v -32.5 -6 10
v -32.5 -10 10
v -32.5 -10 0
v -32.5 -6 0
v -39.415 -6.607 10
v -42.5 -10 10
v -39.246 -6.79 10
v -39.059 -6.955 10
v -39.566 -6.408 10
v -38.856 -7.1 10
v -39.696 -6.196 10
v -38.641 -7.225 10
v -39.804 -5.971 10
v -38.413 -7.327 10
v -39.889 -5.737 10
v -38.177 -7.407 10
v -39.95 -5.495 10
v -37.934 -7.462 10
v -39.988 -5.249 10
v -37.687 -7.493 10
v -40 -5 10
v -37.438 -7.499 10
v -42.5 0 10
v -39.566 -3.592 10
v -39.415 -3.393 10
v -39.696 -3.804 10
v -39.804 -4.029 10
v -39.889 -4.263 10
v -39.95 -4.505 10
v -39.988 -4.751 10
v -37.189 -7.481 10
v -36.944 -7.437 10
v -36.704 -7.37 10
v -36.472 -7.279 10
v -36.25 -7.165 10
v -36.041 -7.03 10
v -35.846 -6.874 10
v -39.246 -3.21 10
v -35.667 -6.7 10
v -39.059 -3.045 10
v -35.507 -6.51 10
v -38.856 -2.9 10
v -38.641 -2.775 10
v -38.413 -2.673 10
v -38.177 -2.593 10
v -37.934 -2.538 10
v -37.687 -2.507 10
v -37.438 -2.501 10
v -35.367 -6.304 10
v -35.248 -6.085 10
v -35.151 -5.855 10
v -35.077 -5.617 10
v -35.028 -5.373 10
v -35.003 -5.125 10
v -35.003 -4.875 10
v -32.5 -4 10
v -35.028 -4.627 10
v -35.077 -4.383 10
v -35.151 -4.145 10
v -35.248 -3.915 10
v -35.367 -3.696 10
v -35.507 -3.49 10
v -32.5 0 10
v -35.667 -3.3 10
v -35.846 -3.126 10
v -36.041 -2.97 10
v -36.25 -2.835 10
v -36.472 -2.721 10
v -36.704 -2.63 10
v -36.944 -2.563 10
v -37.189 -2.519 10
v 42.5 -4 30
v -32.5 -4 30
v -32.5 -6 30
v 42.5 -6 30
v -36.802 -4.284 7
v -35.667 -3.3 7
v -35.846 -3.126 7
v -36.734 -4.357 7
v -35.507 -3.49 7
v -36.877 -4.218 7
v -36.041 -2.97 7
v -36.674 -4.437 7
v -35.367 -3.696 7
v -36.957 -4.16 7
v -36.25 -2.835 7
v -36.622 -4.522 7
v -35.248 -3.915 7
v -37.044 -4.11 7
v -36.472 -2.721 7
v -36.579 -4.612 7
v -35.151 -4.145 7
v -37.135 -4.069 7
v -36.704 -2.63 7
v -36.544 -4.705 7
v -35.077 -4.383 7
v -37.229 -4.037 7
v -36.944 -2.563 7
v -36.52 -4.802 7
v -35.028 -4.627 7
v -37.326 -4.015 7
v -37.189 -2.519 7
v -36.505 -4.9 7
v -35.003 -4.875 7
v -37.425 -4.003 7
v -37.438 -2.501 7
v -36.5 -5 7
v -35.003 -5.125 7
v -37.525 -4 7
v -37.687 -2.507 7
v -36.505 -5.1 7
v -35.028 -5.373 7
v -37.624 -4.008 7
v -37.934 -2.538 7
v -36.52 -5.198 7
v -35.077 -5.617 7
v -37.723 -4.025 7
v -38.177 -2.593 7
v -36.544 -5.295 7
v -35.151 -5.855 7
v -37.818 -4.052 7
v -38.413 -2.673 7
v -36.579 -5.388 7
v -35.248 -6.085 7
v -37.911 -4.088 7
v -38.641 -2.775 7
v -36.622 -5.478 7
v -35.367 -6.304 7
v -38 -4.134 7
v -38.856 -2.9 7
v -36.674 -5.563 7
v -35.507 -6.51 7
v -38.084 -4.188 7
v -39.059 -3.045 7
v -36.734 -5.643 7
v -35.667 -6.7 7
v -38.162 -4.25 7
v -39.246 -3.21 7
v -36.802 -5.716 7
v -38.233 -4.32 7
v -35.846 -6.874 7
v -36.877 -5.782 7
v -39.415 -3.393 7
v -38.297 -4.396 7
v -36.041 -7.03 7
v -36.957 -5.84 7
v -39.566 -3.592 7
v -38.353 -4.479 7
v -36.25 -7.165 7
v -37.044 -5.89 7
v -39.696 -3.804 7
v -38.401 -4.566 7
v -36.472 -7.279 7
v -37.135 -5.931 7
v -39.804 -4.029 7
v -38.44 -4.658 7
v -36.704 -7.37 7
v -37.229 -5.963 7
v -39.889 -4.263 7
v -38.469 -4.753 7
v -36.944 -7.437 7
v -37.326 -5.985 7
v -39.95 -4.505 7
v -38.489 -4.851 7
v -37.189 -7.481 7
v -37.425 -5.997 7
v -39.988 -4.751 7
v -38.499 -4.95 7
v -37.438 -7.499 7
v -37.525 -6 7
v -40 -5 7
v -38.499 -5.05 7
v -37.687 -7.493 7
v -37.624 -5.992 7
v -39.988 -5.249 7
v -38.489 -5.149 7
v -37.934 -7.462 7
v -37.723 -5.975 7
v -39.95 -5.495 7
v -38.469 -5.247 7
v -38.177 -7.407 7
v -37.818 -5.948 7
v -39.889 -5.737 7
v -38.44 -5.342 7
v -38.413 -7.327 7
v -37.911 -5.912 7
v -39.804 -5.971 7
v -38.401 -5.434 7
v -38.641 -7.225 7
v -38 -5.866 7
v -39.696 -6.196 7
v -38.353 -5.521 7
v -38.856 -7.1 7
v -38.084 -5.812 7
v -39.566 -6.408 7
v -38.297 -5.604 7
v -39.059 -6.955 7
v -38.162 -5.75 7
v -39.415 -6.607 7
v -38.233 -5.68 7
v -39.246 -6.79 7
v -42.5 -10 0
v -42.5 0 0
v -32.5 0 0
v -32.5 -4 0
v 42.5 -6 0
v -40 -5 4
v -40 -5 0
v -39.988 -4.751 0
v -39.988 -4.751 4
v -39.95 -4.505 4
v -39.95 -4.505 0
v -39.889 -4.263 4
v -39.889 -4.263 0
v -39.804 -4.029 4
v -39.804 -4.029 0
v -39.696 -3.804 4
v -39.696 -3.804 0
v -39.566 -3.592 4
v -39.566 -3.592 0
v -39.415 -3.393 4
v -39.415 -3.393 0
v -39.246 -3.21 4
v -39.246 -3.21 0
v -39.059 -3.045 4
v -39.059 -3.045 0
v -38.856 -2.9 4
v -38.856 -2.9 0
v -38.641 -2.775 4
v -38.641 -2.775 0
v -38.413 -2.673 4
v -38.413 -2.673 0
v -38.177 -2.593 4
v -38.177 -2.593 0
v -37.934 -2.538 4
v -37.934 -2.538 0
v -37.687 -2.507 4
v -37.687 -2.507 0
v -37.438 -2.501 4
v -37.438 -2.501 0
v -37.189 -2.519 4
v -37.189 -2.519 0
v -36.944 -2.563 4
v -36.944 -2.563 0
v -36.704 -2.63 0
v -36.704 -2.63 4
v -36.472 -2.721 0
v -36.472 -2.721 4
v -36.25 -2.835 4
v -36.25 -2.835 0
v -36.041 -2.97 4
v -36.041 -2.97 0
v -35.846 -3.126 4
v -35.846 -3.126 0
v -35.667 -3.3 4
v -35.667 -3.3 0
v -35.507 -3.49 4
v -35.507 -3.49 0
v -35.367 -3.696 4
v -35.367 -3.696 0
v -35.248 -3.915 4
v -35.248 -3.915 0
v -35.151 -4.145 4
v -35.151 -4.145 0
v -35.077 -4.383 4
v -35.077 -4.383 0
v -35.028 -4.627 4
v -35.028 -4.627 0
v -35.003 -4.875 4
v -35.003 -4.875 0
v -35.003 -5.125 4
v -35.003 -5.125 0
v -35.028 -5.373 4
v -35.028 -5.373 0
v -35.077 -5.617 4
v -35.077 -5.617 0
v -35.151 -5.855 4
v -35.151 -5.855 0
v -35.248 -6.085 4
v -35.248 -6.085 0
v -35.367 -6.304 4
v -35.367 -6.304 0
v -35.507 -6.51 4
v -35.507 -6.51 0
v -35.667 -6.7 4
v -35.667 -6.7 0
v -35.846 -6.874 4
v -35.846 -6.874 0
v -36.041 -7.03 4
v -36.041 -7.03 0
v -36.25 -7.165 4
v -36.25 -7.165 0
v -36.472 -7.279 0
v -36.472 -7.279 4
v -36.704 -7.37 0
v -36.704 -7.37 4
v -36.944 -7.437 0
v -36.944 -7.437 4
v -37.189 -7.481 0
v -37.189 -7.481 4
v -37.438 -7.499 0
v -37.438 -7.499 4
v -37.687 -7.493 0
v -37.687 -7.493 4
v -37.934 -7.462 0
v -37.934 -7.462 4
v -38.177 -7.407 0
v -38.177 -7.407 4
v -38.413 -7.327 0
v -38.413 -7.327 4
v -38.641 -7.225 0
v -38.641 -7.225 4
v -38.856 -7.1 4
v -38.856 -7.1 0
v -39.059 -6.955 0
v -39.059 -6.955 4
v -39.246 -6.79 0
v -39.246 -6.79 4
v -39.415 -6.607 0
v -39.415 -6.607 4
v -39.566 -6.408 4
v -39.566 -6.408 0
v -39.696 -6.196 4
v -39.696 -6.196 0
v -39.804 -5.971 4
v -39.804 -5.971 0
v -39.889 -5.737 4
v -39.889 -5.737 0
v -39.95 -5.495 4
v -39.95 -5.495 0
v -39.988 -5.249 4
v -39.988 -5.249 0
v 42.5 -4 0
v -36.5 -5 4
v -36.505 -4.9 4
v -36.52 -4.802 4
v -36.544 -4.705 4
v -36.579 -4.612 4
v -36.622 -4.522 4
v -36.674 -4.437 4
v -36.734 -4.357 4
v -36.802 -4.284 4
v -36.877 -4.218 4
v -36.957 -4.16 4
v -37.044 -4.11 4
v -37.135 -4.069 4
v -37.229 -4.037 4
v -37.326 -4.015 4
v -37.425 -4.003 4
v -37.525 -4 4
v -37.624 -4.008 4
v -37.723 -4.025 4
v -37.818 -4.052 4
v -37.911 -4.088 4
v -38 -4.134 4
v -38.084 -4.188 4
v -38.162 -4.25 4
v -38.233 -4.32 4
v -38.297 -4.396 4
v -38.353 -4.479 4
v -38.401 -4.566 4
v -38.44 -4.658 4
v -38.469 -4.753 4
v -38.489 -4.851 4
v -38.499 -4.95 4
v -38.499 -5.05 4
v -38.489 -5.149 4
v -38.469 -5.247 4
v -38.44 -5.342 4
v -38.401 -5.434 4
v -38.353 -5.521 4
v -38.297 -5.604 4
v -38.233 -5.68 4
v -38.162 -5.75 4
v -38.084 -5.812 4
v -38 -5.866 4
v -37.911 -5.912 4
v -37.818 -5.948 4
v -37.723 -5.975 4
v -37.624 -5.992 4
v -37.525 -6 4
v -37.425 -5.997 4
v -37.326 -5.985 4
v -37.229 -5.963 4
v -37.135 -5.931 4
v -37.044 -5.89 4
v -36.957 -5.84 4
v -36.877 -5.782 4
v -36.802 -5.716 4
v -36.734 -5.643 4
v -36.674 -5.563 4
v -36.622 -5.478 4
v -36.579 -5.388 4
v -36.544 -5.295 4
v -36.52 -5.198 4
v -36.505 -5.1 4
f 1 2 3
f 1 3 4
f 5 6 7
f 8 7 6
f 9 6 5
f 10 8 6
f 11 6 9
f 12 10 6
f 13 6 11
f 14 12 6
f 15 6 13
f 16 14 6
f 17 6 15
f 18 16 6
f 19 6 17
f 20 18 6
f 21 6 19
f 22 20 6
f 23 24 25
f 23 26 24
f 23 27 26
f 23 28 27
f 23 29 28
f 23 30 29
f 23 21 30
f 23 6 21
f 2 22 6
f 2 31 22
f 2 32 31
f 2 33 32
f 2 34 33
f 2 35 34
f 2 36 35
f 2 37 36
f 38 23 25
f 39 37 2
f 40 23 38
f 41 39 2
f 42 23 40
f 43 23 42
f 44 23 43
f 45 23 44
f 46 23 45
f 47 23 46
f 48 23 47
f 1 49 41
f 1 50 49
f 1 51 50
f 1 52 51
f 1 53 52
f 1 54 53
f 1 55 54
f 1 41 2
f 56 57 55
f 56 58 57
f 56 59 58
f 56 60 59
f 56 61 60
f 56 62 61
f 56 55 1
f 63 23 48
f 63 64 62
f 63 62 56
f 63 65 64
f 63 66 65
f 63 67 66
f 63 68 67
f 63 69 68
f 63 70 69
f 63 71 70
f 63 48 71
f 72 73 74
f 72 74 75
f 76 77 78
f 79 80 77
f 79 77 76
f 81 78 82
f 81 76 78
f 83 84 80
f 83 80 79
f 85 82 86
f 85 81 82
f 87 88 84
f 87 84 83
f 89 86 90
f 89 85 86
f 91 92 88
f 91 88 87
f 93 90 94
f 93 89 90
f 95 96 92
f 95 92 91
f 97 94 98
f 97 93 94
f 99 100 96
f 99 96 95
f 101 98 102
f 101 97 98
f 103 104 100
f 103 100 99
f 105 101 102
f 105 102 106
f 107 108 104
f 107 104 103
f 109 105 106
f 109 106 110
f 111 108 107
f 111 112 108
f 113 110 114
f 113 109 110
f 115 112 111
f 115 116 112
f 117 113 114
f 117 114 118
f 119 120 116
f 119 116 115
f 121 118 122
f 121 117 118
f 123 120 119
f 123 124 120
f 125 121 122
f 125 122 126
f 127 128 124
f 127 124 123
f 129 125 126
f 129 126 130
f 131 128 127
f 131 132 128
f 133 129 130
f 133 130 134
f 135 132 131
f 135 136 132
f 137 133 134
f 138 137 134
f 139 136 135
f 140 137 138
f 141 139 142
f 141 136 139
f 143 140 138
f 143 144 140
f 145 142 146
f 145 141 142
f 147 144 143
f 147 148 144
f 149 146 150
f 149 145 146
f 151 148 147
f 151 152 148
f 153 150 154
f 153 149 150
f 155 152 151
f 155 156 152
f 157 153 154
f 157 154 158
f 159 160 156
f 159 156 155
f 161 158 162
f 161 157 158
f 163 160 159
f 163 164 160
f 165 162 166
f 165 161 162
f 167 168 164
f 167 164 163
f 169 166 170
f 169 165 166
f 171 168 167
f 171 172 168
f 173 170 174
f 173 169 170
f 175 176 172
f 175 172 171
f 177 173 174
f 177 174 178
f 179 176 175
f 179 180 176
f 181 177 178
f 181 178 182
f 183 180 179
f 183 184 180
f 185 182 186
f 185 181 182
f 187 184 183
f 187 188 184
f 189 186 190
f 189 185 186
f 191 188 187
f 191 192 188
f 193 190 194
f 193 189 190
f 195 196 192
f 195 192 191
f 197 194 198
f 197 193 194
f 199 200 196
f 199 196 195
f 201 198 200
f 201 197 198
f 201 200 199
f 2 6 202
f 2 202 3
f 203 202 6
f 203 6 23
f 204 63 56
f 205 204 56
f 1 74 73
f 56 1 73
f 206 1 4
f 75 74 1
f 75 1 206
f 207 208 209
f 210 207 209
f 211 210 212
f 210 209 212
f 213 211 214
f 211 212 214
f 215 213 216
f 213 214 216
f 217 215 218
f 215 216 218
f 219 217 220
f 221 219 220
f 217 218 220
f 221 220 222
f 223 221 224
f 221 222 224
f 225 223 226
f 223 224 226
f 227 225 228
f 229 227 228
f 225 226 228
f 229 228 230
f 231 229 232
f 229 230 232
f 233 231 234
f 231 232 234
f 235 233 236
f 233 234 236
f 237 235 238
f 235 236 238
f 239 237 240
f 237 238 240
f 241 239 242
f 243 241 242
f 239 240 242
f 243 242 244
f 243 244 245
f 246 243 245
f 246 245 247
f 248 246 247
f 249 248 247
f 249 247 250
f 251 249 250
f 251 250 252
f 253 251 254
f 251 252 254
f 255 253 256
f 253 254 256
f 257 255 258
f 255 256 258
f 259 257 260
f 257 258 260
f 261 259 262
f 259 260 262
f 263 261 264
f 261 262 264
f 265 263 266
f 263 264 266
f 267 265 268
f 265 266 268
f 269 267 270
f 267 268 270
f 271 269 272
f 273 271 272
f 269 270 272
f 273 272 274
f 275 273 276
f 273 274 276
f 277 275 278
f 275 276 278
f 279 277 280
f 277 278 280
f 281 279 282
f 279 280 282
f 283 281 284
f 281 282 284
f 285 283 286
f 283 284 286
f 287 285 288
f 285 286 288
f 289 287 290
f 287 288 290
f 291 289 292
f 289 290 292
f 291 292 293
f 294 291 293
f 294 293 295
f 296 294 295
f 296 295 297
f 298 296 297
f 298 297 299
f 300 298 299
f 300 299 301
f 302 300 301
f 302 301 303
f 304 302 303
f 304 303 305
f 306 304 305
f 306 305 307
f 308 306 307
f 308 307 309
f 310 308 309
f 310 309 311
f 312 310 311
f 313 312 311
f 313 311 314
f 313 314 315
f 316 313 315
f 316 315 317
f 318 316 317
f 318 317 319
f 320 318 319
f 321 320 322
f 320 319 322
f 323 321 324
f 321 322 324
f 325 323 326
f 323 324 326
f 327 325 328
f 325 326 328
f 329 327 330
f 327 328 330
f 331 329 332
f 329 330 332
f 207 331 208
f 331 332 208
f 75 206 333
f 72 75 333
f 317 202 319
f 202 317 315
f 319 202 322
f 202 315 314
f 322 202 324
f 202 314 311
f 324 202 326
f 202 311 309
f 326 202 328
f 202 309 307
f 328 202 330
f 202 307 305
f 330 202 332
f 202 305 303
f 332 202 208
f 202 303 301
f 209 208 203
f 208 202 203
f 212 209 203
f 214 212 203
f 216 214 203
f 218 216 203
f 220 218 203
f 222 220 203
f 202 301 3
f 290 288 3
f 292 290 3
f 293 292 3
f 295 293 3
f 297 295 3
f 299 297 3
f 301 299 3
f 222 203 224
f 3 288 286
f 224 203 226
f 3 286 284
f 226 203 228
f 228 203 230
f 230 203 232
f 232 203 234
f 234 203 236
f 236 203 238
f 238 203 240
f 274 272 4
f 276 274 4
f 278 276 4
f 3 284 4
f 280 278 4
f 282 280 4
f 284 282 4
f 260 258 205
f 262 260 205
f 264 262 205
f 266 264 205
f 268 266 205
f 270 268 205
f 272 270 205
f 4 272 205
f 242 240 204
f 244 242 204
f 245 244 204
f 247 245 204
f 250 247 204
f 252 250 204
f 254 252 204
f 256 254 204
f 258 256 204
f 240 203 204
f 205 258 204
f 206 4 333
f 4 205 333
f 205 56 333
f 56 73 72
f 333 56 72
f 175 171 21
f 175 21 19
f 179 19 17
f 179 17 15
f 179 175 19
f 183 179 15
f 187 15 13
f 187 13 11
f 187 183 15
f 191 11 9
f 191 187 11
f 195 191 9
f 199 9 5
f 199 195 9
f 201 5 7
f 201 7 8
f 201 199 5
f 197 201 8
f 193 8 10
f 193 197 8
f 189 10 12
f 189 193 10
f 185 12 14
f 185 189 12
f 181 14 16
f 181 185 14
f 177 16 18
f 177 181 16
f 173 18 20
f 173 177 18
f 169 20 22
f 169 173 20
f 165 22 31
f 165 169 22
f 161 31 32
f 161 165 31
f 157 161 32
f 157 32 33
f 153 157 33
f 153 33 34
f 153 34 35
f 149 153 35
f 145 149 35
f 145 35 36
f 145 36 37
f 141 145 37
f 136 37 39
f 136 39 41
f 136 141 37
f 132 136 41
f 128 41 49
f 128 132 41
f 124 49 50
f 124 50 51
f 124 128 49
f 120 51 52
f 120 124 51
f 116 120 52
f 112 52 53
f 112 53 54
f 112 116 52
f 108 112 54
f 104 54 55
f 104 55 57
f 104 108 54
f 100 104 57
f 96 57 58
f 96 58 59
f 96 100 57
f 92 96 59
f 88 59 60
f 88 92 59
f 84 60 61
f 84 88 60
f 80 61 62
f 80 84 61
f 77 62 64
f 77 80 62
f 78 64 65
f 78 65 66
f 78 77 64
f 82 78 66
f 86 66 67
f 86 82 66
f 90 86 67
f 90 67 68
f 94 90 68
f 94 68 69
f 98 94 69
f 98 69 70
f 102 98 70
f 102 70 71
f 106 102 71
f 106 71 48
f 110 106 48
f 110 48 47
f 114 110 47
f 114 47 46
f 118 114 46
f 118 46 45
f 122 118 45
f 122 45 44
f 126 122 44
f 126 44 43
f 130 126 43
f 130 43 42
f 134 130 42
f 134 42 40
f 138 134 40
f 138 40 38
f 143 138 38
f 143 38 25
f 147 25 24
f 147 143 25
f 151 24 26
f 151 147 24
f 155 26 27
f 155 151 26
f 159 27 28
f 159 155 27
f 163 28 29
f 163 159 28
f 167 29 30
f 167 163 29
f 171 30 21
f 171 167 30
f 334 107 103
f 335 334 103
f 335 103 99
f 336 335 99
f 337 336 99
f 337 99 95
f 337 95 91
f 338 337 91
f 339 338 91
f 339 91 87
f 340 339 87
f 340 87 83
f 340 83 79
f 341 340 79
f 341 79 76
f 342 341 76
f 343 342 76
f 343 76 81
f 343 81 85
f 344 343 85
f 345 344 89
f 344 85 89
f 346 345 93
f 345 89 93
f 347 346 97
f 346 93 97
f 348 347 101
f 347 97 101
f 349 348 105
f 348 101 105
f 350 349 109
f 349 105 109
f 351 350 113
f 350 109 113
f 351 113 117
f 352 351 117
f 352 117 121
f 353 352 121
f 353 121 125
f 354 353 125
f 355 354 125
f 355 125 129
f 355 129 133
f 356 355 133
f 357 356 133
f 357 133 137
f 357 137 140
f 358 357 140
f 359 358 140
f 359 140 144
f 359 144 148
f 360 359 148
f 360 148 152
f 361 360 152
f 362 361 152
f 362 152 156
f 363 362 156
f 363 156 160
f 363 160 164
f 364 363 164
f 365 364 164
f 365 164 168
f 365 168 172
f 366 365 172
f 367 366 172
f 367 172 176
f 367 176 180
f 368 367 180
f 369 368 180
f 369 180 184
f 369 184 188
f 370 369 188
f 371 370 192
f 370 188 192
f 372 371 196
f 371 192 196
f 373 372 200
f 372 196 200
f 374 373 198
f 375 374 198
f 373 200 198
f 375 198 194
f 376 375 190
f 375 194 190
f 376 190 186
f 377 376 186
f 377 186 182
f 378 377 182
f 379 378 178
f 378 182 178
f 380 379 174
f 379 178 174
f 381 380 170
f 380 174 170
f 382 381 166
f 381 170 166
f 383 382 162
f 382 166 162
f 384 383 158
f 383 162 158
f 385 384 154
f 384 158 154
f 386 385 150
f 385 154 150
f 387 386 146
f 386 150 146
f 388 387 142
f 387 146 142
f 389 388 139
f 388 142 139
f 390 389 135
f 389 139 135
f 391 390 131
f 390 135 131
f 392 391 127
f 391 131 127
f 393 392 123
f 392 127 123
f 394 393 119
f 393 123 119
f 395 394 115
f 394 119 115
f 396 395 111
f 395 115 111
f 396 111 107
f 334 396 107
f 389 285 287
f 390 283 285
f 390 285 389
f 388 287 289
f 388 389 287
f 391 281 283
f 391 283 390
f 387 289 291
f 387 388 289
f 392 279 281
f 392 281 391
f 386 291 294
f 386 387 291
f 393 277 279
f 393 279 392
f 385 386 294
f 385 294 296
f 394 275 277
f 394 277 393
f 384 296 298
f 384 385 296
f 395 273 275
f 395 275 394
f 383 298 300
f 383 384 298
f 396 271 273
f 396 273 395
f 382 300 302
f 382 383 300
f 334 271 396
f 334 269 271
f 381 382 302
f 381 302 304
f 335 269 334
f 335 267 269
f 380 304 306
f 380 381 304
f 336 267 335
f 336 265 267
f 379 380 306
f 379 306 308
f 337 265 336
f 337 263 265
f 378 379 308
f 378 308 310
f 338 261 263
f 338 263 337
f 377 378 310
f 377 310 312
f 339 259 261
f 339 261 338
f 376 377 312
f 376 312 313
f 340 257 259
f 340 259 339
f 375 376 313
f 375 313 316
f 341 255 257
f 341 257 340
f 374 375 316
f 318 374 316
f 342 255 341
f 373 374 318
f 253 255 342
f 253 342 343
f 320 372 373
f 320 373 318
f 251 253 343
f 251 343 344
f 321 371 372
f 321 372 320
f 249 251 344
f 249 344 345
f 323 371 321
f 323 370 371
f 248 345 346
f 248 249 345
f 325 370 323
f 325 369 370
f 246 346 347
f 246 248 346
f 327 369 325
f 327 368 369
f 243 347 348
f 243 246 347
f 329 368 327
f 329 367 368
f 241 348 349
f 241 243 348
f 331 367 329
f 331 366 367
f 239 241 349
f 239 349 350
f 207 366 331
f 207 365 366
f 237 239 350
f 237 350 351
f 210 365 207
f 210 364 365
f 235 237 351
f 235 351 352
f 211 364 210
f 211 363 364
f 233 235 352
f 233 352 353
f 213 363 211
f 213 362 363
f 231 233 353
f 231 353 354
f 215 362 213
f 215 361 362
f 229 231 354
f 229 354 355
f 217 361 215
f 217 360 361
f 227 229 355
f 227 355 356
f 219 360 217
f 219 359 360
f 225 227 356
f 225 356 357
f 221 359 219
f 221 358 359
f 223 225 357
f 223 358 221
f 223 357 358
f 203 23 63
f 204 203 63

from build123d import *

# Parameters (mm, degrees)
SKETCH1_W           = 85
SKETCH1_H           = 30
BOSS_EXTRUDE1_DEPTH = 30
CUT_EXTRUDE1_DEPTH  = 30
SKETCH3_W           = 10
SKETCH3_H           = 10
CUT_EXTRUDE2_DEPTH  = 20
SKETCH4_R           = 2.5
CUT_EXTRUDE3_DEPTH  = 4
CUT_EXTRUDE4_START  = -3
SKETCH5_R           = 2.5
CUT_EXTRUDE4_DEPTH  = 3
SKETCH6_R           = 1
CUT_EXTRUDE5_DEPTH  = 50.348252249


with BuildPart() as part:
    # Sketch1 → Boss-Extrude1 (new body)
    with BuildSketch(Plane.XY):
        Rectangle(SKETCH1_W, SKETCH1_H)
    extrude(amount=BOSS_EXTRUDE1_DEPTH)

    # Sketch2 → Cut-Extrude1 (cut)
    with BuildSketch(Plane.XY.offset(30)):
        Polygon((-42.5, 0), (-32.5, 0), (-32.5, -4), (42.5, -4), (42.5, 15), (-42.5, 15), align=None)
        Polygon((-42.5, -10), (-32.5, -10), (-32.5, -6), (42.5, -6), (42.5, -15), (-42.5, -15), align=None)
    extrude(amount=-CUT_EXTRUDE1_DEPTH, mode=Mode.SUBTRACT)

    # Sketch3 → Cut-Extrude2 (cut)
    with BuildSketch(Plane.XY.offset(30)):
        with Locations((-37.5, -5)):
            Rectangle(SKETCH3_W, SKETCH3_H)
    extrude(amount=-CUT_EXTRUDE2_DEPTH, mode=Mode.SUBTRACT)

    # Sketch4 → Cut-Extrude3 (cut)
    with BuildSketch(Plane(origin=(0, 0, 0), x_dir=(-1, 0, 0), z_dir=(0, 0, -1))):
        with Locations((37.5, -5)):
            Circle(SKETCH4_R)
    extrude(amount=-CUT_EXTRUDE3_DEPTH, mode=Mode.SUBTRACT)

    # Sketch5 → Cut-Extrude4 (cut)
    with BuildSketch(Plane.XY.offset(10).offset(CUT_EXTRUDE4_START)):
        with Locations(Location((-37.5, -5, 0), (0, 0, 180))):
            Circle(SKETCH5_R)
    extrude(amount=CUT_EXTRUDE4_DEPTH, mode=Mode.SUBTRACT)

    # Sketch6 → Cut-Extrude5 (cut, through all)
    with BuildSketch(Plane.XY.offset(7)):
        with Locations((-37.5, -5)):
            Circle(SKETCH6_R)
    extrude(amount=-CUT_EXTRUDE5_DEPTH, mode=Mode.SUBTRACT)


solid = part.part
